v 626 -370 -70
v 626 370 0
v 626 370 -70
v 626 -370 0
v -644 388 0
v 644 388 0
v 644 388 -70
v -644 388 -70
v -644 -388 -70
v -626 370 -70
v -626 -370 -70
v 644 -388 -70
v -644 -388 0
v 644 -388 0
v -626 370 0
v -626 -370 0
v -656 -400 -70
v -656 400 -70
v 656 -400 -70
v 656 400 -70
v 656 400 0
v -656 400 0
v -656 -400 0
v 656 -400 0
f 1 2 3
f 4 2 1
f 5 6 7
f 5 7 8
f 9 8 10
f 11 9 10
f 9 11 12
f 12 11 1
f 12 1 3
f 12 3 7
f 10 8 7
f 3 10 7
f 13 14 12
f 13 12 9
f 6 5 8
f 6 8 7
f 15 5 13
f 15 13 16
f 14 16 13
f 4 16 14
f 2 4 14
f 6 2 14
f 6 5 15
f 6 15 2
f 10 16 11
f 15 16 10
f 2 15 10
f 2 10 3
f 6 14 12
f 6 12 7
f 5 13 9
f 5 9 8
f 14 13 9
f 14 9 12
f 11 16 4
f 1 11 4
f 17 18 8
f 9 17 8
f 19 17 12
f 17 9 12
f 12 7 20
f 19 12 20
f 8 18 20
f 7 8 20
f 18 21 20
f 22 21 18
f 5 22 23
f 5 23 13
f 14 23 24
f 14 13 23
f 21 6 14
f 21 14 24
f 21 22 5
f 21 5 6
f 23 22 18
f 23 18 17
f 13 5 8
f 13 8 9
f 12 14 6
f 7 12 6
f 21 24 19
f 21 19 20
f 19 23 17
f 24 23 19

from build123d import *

# Parameters (mm, degrees)
F0_W     = 1252
F0_H     = 18
F1_DEPTH = 70
F0_W_2   = 12
F0_H_2   = 776
F2_DEPTH = 70


with BuildPart() as f1:
    # F0 (on Top) → F1 (new body)
    with BuildSketch(Plane.XY):
        with Locations((0, 379)):
            Rectangle(F0_W, F0_H)
        with Locations((0, -379)):
            Rectangle(F0_W, F0_H)
        Polygon((-644, 388), (-644, -388), (-626, -388), (-626, -370), (-626, 370), (-626, 388), align=None)
        Polygon((626, -388), (644, -388), (644, 388), (626, 388), (626, 370), (626, -370), align=None)
    extrude(amount=-F1_DEPTH)


with BuildPart() as f2:
    # F0 (on Top) → F2 (new body)
    with BuildSketch(Plane.XY):
        Polygon((644, 388), (656, 388), (656, 400), (-656, 400), (-656, 388), (-644, 388), (-626, 388), (626, 388), align=None)
        with Locations((-650, 0)):
            Rectangle(F0_W_2, F0_H_2)
        Polygon((-656, -400), (656, -400), (656, -388), (644, -388), (626, -388), (-626, -388), (-644, -388), (-656, -388), align=None)
        with Locations((650, 0)):
            Rectangle(F0_W_2, F0_H_2)
    extrude(amount=-F2_DEPTH)


solid = Compound([f1.part, f2.part])
